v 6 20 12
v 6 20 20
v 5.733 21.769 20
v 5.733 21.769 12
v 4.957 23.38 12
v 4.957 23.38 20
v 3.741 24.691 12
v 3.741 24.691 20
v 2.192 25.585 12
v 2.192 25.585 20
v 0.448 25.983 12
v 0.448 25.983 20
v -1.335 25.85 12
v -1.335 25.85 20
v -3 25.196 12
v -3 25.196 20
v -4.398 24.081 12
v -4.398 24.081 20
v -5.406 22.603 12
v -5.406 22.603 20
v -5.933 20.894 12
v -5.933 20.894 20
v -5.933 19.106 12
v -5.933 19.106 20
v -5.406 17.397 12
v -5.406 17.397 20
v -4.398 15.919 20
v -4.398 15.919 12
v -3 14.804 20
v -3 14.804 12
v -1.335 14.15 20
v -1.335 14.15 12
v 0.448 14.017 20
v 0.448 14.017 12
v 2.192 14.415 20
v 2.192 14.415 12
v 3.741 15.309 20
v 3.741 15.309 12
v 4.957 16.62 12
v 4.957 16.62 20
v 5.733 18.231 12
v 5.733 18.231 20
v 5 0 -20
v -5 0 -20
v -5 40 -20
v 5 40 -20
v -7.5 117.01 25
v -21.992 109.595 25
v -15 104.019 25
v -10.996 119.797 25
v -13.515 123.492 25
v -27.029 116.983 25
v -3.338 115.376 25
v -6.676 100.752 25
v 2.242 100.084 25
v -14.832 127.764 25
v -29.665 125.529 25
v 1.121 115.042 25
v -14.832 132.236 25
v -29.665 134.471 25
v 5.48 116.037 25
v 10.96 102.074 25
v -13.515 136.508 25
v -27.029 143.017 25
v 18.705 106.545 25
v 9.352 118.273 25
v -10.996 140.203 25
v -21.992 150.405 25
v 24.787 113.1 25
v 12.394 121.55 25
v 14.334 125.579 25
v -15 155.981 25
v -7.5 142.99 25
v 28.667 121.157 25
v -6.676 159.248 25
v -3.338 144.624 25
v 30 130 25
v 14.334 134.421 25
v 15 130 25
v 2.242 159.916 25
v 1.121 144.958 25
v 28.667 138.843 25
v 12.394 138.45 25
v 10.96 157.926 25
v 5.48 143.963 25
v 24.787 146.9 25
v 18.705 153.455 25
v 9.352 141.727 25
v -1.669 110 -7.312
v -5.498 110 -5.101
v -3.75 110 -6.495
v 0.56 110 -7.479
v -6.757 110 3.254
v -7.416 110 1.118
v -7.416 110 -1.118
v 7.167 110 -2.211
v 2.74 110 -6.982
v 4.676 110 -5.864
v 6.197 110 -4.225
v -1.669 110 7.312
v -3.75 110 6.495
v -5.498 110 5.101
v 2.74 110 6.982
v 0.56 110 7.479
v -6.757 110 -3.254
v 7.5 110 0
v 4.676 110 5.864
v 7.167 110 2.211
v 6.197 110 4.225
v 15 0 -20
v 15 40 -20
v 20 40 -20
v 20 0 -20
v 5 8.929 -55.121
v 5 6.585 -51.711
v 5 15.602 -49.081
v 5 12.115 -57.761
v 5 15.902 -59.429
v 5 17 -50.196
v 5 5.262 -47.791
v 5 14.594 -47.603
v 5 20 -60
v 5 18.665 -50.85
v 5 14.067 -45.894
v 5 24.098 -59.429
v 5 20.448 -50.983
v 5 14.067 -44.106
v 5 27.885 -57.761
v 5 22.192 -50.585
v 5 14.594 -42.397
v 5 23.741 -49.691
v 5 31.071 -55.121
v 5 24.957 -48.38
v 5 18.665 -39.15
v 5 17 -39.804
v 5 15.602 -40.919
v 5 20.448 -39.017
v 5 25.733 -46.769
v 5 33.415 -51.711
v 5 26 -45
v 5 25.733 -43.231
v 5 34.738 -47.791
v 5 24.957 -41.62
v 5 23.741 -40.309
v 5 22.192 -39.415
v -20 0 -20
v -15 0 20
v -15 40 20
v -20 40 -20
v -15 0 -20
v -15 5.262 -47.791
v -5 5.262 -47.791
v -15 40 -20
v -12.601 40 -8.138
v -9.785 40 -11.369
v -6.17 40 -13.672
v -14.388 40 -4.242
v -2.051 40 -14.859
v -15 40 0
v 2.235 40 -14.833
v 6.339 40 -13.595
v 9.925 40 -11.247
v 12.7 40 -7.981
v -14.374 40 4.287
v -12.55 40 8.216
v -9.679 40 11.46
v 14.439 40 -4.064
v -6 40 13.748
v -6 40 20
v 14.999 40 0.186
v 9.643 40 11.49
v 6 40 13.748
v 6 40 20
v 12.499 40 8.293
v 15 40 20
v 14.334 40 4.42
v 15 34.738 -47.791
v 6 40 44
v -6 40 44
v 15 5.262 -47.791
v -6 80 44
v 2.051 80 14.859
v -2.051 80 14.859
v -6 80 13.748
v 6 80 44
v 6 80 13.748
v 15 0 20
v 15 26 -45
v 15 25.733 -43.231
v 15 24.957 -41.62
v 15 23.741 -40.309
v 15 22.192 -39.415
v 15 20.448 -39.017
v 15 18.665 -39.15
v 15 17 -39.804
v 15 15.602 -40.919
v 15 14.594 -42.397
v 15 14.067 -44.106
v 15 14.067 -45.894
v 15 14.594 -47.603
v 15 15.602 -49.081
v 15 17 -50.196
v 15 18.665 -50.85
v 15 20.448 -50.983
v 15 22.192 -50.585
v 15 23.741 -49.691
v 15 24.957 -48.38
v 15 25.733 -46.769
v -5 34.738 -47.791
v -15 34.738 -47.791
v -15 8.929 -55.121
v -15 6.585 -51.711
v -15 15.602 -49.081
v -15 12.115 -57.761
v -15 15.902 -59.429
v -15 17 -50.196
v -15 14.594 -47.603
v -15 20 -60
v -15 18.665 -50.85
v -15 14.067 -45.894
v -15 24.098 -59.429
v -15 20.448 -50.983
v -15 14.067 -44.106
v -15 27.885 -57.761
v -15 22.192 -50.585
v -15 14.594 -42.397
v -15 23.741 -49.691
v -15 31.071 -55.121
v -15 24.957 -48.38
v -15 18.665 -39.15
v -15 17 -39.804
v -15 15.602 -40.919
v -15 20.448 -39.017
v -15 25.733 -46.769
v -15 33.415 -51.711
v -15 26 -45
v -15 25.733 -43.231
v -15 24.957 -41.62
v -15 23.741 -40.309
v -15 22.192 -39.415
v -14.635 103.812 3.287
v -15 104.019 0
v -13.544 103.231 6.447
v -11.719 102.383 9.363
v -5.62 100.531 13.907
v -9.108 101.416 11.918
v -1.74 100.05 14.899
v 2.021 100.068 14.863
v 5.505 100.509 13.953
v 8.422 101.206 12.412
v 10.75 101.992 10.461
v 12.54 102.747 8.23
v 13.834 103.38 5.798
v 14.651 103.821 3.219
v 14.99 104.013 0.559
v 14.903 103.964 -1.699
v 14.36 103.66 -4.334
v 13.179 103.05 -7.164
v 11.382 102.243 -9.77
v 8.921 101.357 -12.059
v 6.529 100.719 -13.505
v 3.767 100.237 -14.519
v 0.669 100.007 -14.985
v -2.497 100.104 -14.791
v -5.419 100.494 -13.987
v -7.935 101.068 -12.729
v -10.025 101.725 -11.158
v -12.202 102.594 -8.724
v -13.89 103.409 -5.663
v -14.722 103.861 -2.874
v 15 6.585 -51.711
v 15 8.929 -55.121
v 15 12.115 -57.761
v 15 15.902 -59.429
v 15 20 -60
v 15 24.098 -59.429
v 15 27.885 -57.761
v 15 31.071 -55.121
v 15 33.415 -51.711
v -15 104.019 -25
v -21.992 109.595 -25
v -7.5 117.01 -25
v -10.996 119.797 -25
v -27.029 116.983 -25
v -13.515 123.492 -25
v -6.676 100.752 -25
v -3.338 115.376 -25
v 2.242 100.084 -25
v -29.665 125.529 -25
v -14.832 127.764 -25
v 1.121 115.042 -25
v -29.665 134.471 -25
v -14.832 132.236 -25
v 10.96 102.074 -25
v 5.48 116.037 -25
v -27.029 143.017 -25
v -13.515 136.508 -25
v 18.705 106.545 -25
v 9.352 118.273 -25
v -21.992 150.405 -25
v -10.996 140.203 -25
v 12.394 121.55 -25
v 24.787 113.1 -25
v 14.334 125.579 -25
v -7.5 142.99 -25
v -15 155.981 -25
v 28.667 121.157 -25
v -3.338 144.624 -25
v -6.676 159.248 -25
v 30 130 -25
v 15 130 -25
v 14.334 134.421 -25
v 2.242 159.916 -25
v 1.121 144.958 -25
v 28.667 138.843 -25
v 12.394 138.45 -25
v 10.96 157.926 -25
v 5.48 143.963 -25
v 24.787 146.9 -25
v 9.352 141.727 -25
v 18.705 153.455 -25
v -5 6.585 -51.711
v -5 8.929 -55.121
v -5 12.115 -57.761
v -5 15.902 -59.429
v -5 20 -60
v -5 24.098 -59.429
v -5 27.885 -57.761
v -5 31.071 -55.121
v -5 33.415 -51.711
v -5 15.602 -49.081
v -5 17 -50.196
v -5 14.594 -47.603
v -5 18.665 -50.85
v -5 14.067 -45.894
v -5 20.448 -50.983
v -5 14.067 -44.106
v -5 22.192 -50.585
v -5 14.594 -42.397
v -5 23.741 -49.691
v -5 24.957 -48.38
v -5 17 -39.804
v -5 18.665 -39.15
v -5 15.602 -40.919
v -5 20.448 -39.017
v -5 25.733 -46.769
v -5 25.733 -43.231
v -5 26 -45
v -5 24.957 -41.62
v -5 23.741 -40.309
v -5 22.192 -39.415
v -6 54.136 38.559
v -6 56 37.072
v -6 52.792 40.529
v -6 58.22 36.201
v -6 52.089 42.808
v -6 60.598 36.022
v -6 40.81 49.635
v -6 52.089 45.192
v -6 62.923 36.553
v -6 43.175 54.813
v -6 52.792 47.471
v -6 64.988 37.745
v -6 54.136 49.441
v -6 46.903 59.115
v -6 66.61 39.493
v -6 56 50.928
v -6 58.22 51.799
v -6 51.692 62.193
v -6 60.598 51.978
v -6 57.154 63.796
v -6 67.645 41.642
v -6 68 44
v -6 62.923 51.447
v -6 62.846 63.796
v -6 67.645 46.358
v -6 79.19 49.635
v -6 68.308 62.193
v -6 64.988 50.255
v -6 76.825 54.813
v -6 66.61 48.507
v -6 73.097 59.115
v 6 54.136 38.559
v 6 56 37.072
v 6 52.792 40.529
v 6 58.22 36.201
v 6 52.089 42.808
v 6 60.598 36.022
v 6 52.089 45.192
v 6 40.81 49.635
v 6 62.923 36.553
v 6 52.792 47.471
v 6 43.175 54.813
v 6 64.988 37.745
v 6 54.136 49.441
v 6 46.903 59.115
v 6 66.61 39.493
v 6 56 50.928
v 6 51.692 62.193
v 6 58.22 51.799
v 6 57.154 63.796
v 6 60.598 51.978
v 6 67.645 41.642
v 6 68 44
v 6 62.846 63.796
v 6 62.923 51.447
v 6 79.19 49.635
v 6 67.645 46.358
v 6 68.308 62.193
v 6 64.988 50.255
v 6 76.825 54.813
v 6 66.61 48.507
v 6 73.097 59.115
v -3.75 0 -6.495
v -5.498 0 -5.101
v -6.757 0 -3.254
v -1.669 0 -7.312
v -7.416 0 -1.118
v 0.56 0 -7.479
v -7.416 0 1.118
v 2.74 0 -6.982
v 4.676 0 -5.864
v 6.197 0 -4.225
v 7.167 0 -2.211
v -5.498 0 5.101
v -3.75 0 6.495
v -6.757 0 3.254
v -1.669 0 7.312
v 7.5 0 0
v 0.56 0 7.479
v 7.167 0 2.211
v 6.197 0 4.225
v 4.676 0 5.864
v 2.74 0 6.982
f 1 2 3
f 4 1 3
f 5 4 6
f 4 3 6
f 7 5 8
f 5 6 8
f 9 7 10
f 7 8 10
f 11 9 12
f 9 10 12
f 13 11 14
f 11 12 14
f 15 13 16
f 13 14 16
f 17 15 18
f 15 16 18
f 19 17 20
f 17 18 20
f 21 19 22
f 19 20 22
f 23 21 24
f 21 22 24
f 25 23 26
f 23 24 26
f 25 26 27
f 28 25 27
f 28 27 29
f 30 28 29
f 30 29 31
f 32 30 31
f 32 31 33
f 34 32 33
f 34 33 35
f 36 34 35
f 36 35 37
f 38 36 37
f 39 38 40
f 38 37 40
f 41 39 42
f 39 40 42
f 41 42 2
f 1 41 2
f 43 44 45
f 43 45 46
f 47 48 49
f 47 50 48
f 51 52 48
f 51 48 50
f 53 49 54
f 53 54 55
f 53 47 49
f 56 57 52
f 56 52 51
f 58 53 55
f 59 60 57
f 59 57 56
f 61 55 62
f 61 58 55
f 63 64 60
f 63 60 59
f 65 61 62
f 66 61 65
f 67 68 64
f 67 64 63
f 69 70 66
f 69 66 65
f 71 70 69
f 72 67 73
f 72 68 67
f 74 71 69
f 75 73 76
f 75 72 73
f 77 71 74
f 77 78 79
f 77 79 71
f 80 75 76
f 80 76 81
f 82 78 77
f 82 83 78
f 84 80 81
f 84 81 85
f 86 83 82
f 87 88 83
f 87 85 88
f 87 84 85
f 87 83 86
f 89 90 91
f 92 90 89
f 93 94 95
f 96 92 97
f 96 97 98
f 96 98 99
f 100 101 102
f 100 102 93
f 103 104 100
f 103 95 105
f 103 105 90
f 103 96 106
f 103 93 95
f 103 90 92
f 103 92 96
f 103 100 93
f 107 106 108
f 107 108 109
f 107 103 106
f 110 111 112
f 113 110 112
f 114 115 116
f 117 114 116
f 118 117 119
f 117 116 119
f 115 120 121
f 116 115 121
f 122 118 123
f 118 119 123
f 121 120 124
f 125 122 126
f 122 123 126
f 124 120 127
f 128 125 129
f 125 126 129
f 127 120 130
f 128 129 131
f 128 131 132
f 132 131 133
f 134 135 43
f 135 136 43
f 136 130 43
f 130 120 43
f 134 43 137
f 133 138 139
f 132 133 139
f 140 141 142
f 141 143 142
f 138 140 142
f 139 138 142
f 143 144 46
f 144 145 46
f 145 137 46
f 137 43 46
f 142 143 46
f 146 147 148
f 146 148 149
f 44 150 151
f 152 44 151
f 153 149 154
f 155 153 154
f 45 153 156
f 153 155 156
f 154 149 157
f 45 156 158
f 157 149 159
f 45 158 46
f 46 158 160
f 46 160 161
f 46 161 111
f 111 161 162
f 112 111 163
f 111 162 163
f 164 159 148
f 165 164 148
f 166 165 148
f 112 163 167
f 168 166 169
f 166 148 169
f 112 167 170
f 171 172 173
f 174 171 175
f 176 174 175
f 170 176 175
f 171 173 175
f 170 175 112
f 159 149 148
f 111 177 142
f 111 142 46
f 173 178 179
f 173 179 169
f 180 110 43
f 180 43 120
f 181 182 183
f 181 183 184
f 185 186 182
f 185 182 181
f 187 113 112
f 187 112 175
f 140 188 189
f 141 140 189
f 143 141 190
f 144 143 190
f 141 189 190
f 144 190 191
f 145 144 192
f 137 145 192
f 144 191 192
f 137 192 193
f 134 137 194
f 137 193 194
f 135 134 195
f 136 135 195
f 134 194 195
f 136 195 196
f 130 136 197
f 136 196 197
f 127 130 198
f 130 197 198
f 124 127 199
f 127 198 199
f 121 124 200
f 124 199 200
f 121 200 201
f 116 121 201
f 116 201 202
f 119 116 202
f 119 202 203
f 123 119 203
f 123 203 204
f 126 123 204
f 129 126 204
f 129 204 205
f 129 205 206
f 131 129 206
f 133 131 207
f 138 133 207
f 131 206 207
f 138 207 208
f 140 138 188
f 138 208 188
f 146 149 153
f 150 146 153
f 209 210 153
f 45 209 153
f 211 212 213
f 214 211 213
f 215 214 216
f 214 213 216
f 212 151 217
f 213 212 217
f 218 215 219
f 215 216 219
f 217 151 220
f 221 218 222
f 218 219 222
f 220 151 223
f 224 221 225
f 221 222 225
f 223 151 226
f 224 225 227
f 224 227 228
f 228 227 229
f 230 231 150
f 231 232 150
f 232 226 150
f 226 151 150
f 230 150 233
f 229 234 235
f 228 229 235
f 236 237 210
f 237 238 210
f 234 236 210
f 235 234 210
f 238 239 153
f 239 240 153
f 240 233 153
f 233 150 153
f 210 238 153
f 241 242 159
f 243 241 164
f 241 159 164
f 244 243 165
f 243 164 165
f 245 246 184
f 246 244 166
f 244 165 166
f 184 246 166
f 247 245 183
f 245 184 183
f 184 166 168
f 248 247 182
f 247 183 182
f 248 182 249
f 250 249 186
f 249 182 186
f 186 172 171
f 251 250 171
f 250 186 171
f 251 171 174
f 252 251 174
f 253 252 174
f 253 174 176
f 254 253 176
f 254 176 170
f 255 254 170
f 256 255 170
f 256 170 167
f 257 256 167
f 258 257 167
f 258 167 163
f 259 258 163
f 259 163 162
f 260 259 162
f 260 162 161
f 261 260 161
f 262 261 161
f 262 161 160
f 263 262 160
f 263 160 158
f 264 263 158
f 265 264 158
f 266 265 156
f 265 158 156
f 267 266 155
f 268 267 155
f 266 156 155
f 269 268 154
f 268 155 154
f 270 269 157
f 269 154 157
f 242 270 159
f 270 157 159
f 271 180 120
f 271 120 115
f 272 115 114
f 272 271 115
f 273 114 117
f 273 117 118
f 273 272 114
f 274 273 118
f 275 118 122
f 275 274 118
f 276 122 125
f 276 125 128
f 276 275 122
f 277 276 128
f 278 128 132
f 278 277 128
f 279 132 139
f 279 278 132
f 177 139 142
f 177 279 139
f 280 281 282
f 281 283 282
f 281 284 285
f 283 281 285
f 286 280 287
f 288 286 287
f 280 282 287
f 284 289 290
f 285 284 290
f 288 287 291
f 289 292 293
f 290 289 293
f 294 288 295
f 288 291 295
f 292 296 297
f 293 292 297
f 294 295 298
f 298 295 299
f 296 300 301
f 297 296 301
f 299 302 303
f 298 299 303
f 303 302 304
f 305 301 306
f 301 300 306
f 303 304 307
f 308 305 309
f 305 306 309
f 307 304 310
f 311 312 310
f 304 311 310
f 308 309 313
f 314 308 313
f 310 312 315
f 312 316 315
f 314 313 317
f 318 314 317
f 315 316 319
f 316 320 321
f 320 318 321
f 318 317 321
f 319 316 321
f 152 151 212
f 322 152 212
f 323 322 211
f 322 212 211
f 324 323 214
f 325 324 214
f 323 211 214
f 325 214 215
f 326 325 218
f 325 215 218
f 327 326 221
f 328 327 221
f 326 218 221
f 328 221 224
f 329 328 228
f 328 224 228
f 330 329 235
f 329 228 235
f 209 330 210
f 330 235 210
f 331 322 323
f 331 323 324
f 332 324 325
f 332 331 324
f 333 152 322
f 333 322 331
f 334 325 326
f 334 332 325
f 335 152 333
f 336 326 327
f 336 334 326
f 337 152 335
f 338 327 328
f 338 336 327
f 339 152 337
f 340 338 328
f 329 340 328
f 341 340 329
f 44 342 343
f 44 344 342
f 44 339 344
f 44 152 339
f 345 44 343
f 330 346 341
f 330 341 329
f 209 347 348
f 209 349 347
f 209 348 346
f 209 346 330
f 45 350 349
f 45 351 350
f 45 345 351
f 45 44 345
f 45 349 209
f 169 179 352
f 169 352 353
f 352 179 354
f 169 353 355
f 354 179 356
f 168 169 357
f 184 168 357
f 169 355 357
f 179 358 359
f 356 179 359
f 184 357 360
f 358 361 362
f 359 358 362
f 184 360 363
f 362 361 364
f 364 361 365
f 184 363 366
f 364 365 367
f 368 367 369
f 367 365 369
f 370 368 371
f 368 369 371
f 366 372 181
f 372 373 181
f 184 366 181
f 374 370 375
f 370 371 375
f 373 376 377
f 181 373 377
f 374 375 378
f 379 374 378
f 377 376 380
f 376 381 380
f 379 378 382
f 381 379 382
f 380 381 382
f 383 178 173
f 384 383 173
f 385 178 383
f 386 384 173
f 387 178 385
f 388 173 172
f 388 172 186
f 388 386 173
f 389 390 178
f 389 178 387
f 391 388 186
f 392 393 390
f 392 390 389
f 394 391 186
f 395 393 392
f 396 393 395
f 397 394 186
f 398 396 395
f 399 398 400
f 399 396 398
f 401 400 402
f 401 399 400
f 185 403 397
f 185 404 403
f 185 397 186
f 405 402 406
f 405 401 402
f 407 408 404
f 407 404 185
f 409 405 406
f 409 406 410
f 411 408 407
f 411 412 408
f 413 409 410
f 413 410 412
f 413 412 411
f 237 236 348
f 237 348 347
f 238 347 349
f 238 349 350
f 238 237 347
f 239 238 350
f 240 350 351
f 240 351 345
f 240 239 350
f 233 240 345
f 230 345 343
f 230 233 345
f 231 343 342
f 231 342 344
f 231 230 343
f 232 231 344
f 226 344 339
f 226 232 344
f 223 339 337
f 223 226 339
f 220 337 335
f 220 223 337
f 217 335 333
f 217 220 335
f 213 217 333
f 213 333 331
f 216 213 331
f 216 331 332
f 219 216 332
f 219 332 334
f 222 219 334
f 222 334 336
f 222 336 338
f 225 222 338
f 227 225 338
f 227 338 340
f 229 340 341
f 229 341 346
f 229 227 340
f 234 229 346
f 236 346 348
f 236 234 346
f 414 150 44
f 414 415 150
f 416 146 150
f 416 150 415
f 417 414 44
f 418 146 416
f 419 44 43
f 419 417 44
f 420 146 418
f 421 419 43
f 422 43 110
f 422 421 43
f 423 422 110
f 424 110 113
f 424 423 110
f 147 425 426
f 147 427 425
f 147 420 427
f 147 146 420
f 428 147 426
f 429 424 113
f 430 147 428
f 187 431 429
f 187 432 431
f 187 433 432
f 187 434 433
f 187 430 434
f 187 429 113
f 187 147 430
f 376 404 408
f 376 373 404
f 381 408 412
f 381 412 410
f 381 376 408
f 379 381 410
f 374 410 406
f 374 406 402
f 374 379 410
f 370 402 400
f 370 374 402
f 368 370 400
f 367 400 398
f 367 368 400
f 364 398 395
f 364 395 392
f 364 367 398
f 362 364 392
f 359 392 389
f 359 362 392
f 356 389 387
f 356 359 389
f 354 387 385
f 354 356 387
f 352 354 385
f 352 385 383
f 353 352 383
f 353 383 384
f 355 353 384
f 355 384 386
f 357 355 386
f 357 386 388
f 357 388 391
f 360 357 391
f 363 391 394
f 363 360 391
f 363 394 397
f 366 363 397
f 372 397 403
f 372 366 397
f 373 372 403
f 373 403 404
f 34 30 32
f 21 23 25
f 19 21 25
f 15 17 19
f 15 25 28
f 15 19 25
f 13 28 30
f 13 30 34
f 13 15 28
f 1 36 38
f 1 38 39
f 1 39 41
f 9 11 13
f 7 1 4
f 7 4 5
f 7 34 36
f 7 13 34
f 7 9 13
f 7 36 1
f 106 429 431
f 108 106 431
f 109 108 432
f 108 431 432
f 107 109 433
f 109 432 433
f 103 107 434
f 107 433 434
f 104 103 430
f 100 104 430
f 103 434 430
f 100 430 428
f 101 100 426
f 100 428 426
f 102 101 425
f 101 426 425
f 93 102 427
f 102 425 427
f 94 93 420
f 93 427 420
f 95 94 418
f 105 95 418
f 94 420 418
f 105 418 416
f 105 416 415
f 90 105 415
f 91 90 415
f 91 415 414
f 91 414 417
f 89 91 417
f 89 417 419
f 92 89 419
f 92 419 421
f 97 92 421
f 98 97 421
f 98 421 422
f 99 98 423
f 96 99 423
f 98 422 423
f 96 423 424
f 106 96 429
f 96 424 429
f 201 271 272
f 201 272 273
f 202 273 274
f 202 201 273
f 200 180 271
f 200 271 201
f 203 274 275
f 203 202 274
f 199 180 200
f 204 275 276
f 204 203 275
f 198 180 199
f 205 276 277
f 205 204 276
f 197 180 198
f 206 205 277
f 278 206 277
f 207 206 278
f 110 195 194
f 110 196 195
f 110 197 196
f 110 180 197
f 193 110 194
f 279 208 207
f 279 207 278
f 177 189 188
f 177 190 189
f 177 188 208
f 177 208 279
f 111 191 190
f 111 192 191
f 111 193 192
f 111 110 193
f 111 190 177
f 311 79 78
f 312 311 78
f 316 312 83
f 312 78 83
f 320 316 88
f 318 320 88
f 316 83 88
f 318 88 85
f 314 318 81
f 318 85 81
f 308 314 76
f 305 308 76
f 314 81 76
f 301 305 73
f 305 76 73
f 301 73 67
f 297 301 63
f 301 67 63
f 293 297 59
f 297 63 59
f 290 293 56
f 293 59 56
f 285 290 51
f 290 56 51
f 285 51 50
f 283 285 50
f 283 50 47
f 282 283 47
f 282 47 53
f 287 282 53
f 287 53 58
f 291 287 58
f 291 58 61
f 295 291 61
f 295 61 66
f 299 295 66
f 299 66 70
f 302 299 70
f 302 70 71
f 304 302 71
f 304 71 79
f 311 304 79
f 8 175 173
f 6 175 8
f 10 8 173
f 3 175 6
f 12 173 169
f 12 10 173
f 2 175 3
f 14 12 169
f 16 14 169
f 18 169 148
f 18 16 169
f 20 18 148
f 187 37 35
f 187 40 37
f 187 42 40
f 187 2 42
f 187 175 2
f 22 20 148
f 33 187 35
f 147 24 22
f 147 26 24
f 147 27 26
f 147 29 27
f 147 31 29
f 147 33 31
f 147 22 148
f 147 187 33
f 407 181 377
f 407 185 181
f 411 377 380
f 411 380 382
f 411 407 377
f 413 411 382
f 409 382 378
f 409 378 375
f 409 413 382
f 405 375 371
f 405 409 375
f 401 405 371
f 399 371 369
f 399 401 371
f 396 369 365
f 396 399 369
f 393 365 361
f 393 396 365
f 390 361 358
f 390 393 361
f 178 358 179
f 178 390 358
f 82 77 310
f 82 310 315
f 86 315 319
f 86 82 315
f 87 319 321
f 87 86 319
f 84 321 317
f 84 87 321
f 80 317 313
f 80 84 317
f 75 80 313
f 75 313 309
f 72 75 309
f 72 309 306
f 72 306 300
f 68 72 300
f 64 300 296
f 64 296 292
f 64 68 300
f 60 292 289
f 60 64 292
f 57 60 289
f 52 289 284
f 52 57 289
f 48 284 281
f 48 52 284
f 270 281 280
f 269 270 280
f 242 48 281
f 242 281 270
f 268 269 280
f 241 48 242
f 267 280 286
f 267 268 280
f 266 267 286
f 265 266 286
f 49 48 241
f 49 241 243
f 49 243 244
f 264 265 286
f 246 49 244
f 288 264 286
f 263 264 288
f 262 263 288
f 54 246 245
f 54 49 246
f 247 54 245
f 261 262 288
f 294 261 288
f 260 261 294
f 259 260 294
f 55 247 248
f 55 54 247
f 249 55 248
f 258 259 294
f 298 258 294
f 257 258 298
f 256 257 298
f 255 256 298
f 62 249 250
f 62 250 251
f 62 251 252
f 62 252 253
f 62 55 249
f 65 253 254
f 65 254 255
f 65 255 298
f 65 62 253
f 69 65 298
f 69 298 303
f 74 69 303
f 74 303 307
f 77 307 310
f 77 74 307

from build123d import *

# Parameters (mm, degrees)
F1_DEPTH  = 40
F2_R      = 15
F3_DEPTH  = 90
F4_R      = 30
F5_DEPTH  = 25
F6_R      = 8
F7_DEPTH  = 6
F10_DEPTH = 10
F11_R     = 6
F12_DEPTH = 10
F13_R     = 15
F14_DEPTH = 85.001
F15_R     = 6
F16_DEPTH = 8
F17_R     = 7.5
F18_DEPTH = 110


# Not quite as in the source:
# - a pattern or mirror of a feature is missing from the dataset's text; its kind, count and spacing are read off the source's solid


with BuildPart() as f1:
    # F0 (on Front) → F1 (new body)
    with BuildSketch(Plane.XZ):
        Polygon((15, 20), (-15, 20), (-20, -20), (20, -20), align=None)
    extrude(amount=-F1_DEPTH)

    # F2 (on face) → F3 (join)
    with BuildSketch(Plane(origin=(0, 40, 0), x_dir=(-1, 0, 0), z_dir=(0, 1, 0))):
        Circle(F2_R)
    extrude(amount=F3_DEPTH)

    # F4 (on Top) → F5 (join, symmetric)
    with BuildSketch(Plane.XY):
        with Locations((0, 130)):
            Circle(F4_R)
    extrude(amount=F5_DEPTH, both=True)

    # F6 (on Right) → F7 (join, symmetric)
    with BuildSketch(Plane.YZ):
        with BuildLine():
            Line((40, 44), (40, 10.4397451505))
            Line((40, 10.4397451505), (40, 6.8427645601))
            Line((40, 6.8427645601), (80, 6.8427645601))
            Line((80, 6.8427645601), (80, 44))
            ThreePointArc((80, 44), (60, 64), (40, 44))
        make_face()
        with Locations((60, 44)):
            Circle(F6_R, mode=Mode.SUBTRACT)
    extrude(amount=F7_DEPTH, both=True)

    # F9 (on offset) → F10 (join)
    with BuildSketch(Plane.YZ.offset(15)):
        with BuildLine():
            Line((0, -20), (5.2618519826, -47.7905184139))
            ThreePointArc((5.2618519826, -47.7905184139), (20, -60), (34.7381480174, -47.7905184139))
            Line((34.7381480174, -47.7905184139), (40, -20))
            Line((40, -20), (0, -20))
        make_face()
    f10 = extrude(amount=-F10_DEPTH)

    # F10_copies: F10 across plane
    add(f10.mirror(Plane(origin=(0, 0, 0), x_dir=(0, 0, -1), z_dir=(-1, 0, 0))))

    # F11 (on face) → F12 (cut, through all)
    with BuildSketch(Plane.YZ.offset(15)):
        with Locations((20, -45)):
            Circle(F11_R)
    f12 = extrude(amount=-F12_DEPTH, mode=Mode.SUBTRACT)

    # F12_copies: F12 across plane
    add(f12.mirror(Plane(origin=(0, 0, 0), x_dir=(0, 0, -1), z_dir=(-1, 0, 0))), mode=Mode.SUBTRACT)

    # F13 (on face) → F14 (cut, through all)
    with BuildSketch(Plane.XY.offset(25)):
        with Locations((0, 130)):
            Circle(F13_R)
    extrude(amount=-F14_DEPTH, mode=Mode.SUBTRACT)

    # F15 (on face) → F16 (cut)
    with BuildSketch(Plane.XY.offset(20)):
        with Locations((0, 20)):
            Circle(F15_R)
    extrude(amount=-F16_DEPTH, mode=Mode.SUBTRACT)

    # F17 (on face) → F18 (cut)
    with BuildSketch(Plane.XZ):
        Circle(F17_R)
    extrude(amount=-F18_DEPTH, mode=Mode.SUBTRACT)


solid = f1.part
